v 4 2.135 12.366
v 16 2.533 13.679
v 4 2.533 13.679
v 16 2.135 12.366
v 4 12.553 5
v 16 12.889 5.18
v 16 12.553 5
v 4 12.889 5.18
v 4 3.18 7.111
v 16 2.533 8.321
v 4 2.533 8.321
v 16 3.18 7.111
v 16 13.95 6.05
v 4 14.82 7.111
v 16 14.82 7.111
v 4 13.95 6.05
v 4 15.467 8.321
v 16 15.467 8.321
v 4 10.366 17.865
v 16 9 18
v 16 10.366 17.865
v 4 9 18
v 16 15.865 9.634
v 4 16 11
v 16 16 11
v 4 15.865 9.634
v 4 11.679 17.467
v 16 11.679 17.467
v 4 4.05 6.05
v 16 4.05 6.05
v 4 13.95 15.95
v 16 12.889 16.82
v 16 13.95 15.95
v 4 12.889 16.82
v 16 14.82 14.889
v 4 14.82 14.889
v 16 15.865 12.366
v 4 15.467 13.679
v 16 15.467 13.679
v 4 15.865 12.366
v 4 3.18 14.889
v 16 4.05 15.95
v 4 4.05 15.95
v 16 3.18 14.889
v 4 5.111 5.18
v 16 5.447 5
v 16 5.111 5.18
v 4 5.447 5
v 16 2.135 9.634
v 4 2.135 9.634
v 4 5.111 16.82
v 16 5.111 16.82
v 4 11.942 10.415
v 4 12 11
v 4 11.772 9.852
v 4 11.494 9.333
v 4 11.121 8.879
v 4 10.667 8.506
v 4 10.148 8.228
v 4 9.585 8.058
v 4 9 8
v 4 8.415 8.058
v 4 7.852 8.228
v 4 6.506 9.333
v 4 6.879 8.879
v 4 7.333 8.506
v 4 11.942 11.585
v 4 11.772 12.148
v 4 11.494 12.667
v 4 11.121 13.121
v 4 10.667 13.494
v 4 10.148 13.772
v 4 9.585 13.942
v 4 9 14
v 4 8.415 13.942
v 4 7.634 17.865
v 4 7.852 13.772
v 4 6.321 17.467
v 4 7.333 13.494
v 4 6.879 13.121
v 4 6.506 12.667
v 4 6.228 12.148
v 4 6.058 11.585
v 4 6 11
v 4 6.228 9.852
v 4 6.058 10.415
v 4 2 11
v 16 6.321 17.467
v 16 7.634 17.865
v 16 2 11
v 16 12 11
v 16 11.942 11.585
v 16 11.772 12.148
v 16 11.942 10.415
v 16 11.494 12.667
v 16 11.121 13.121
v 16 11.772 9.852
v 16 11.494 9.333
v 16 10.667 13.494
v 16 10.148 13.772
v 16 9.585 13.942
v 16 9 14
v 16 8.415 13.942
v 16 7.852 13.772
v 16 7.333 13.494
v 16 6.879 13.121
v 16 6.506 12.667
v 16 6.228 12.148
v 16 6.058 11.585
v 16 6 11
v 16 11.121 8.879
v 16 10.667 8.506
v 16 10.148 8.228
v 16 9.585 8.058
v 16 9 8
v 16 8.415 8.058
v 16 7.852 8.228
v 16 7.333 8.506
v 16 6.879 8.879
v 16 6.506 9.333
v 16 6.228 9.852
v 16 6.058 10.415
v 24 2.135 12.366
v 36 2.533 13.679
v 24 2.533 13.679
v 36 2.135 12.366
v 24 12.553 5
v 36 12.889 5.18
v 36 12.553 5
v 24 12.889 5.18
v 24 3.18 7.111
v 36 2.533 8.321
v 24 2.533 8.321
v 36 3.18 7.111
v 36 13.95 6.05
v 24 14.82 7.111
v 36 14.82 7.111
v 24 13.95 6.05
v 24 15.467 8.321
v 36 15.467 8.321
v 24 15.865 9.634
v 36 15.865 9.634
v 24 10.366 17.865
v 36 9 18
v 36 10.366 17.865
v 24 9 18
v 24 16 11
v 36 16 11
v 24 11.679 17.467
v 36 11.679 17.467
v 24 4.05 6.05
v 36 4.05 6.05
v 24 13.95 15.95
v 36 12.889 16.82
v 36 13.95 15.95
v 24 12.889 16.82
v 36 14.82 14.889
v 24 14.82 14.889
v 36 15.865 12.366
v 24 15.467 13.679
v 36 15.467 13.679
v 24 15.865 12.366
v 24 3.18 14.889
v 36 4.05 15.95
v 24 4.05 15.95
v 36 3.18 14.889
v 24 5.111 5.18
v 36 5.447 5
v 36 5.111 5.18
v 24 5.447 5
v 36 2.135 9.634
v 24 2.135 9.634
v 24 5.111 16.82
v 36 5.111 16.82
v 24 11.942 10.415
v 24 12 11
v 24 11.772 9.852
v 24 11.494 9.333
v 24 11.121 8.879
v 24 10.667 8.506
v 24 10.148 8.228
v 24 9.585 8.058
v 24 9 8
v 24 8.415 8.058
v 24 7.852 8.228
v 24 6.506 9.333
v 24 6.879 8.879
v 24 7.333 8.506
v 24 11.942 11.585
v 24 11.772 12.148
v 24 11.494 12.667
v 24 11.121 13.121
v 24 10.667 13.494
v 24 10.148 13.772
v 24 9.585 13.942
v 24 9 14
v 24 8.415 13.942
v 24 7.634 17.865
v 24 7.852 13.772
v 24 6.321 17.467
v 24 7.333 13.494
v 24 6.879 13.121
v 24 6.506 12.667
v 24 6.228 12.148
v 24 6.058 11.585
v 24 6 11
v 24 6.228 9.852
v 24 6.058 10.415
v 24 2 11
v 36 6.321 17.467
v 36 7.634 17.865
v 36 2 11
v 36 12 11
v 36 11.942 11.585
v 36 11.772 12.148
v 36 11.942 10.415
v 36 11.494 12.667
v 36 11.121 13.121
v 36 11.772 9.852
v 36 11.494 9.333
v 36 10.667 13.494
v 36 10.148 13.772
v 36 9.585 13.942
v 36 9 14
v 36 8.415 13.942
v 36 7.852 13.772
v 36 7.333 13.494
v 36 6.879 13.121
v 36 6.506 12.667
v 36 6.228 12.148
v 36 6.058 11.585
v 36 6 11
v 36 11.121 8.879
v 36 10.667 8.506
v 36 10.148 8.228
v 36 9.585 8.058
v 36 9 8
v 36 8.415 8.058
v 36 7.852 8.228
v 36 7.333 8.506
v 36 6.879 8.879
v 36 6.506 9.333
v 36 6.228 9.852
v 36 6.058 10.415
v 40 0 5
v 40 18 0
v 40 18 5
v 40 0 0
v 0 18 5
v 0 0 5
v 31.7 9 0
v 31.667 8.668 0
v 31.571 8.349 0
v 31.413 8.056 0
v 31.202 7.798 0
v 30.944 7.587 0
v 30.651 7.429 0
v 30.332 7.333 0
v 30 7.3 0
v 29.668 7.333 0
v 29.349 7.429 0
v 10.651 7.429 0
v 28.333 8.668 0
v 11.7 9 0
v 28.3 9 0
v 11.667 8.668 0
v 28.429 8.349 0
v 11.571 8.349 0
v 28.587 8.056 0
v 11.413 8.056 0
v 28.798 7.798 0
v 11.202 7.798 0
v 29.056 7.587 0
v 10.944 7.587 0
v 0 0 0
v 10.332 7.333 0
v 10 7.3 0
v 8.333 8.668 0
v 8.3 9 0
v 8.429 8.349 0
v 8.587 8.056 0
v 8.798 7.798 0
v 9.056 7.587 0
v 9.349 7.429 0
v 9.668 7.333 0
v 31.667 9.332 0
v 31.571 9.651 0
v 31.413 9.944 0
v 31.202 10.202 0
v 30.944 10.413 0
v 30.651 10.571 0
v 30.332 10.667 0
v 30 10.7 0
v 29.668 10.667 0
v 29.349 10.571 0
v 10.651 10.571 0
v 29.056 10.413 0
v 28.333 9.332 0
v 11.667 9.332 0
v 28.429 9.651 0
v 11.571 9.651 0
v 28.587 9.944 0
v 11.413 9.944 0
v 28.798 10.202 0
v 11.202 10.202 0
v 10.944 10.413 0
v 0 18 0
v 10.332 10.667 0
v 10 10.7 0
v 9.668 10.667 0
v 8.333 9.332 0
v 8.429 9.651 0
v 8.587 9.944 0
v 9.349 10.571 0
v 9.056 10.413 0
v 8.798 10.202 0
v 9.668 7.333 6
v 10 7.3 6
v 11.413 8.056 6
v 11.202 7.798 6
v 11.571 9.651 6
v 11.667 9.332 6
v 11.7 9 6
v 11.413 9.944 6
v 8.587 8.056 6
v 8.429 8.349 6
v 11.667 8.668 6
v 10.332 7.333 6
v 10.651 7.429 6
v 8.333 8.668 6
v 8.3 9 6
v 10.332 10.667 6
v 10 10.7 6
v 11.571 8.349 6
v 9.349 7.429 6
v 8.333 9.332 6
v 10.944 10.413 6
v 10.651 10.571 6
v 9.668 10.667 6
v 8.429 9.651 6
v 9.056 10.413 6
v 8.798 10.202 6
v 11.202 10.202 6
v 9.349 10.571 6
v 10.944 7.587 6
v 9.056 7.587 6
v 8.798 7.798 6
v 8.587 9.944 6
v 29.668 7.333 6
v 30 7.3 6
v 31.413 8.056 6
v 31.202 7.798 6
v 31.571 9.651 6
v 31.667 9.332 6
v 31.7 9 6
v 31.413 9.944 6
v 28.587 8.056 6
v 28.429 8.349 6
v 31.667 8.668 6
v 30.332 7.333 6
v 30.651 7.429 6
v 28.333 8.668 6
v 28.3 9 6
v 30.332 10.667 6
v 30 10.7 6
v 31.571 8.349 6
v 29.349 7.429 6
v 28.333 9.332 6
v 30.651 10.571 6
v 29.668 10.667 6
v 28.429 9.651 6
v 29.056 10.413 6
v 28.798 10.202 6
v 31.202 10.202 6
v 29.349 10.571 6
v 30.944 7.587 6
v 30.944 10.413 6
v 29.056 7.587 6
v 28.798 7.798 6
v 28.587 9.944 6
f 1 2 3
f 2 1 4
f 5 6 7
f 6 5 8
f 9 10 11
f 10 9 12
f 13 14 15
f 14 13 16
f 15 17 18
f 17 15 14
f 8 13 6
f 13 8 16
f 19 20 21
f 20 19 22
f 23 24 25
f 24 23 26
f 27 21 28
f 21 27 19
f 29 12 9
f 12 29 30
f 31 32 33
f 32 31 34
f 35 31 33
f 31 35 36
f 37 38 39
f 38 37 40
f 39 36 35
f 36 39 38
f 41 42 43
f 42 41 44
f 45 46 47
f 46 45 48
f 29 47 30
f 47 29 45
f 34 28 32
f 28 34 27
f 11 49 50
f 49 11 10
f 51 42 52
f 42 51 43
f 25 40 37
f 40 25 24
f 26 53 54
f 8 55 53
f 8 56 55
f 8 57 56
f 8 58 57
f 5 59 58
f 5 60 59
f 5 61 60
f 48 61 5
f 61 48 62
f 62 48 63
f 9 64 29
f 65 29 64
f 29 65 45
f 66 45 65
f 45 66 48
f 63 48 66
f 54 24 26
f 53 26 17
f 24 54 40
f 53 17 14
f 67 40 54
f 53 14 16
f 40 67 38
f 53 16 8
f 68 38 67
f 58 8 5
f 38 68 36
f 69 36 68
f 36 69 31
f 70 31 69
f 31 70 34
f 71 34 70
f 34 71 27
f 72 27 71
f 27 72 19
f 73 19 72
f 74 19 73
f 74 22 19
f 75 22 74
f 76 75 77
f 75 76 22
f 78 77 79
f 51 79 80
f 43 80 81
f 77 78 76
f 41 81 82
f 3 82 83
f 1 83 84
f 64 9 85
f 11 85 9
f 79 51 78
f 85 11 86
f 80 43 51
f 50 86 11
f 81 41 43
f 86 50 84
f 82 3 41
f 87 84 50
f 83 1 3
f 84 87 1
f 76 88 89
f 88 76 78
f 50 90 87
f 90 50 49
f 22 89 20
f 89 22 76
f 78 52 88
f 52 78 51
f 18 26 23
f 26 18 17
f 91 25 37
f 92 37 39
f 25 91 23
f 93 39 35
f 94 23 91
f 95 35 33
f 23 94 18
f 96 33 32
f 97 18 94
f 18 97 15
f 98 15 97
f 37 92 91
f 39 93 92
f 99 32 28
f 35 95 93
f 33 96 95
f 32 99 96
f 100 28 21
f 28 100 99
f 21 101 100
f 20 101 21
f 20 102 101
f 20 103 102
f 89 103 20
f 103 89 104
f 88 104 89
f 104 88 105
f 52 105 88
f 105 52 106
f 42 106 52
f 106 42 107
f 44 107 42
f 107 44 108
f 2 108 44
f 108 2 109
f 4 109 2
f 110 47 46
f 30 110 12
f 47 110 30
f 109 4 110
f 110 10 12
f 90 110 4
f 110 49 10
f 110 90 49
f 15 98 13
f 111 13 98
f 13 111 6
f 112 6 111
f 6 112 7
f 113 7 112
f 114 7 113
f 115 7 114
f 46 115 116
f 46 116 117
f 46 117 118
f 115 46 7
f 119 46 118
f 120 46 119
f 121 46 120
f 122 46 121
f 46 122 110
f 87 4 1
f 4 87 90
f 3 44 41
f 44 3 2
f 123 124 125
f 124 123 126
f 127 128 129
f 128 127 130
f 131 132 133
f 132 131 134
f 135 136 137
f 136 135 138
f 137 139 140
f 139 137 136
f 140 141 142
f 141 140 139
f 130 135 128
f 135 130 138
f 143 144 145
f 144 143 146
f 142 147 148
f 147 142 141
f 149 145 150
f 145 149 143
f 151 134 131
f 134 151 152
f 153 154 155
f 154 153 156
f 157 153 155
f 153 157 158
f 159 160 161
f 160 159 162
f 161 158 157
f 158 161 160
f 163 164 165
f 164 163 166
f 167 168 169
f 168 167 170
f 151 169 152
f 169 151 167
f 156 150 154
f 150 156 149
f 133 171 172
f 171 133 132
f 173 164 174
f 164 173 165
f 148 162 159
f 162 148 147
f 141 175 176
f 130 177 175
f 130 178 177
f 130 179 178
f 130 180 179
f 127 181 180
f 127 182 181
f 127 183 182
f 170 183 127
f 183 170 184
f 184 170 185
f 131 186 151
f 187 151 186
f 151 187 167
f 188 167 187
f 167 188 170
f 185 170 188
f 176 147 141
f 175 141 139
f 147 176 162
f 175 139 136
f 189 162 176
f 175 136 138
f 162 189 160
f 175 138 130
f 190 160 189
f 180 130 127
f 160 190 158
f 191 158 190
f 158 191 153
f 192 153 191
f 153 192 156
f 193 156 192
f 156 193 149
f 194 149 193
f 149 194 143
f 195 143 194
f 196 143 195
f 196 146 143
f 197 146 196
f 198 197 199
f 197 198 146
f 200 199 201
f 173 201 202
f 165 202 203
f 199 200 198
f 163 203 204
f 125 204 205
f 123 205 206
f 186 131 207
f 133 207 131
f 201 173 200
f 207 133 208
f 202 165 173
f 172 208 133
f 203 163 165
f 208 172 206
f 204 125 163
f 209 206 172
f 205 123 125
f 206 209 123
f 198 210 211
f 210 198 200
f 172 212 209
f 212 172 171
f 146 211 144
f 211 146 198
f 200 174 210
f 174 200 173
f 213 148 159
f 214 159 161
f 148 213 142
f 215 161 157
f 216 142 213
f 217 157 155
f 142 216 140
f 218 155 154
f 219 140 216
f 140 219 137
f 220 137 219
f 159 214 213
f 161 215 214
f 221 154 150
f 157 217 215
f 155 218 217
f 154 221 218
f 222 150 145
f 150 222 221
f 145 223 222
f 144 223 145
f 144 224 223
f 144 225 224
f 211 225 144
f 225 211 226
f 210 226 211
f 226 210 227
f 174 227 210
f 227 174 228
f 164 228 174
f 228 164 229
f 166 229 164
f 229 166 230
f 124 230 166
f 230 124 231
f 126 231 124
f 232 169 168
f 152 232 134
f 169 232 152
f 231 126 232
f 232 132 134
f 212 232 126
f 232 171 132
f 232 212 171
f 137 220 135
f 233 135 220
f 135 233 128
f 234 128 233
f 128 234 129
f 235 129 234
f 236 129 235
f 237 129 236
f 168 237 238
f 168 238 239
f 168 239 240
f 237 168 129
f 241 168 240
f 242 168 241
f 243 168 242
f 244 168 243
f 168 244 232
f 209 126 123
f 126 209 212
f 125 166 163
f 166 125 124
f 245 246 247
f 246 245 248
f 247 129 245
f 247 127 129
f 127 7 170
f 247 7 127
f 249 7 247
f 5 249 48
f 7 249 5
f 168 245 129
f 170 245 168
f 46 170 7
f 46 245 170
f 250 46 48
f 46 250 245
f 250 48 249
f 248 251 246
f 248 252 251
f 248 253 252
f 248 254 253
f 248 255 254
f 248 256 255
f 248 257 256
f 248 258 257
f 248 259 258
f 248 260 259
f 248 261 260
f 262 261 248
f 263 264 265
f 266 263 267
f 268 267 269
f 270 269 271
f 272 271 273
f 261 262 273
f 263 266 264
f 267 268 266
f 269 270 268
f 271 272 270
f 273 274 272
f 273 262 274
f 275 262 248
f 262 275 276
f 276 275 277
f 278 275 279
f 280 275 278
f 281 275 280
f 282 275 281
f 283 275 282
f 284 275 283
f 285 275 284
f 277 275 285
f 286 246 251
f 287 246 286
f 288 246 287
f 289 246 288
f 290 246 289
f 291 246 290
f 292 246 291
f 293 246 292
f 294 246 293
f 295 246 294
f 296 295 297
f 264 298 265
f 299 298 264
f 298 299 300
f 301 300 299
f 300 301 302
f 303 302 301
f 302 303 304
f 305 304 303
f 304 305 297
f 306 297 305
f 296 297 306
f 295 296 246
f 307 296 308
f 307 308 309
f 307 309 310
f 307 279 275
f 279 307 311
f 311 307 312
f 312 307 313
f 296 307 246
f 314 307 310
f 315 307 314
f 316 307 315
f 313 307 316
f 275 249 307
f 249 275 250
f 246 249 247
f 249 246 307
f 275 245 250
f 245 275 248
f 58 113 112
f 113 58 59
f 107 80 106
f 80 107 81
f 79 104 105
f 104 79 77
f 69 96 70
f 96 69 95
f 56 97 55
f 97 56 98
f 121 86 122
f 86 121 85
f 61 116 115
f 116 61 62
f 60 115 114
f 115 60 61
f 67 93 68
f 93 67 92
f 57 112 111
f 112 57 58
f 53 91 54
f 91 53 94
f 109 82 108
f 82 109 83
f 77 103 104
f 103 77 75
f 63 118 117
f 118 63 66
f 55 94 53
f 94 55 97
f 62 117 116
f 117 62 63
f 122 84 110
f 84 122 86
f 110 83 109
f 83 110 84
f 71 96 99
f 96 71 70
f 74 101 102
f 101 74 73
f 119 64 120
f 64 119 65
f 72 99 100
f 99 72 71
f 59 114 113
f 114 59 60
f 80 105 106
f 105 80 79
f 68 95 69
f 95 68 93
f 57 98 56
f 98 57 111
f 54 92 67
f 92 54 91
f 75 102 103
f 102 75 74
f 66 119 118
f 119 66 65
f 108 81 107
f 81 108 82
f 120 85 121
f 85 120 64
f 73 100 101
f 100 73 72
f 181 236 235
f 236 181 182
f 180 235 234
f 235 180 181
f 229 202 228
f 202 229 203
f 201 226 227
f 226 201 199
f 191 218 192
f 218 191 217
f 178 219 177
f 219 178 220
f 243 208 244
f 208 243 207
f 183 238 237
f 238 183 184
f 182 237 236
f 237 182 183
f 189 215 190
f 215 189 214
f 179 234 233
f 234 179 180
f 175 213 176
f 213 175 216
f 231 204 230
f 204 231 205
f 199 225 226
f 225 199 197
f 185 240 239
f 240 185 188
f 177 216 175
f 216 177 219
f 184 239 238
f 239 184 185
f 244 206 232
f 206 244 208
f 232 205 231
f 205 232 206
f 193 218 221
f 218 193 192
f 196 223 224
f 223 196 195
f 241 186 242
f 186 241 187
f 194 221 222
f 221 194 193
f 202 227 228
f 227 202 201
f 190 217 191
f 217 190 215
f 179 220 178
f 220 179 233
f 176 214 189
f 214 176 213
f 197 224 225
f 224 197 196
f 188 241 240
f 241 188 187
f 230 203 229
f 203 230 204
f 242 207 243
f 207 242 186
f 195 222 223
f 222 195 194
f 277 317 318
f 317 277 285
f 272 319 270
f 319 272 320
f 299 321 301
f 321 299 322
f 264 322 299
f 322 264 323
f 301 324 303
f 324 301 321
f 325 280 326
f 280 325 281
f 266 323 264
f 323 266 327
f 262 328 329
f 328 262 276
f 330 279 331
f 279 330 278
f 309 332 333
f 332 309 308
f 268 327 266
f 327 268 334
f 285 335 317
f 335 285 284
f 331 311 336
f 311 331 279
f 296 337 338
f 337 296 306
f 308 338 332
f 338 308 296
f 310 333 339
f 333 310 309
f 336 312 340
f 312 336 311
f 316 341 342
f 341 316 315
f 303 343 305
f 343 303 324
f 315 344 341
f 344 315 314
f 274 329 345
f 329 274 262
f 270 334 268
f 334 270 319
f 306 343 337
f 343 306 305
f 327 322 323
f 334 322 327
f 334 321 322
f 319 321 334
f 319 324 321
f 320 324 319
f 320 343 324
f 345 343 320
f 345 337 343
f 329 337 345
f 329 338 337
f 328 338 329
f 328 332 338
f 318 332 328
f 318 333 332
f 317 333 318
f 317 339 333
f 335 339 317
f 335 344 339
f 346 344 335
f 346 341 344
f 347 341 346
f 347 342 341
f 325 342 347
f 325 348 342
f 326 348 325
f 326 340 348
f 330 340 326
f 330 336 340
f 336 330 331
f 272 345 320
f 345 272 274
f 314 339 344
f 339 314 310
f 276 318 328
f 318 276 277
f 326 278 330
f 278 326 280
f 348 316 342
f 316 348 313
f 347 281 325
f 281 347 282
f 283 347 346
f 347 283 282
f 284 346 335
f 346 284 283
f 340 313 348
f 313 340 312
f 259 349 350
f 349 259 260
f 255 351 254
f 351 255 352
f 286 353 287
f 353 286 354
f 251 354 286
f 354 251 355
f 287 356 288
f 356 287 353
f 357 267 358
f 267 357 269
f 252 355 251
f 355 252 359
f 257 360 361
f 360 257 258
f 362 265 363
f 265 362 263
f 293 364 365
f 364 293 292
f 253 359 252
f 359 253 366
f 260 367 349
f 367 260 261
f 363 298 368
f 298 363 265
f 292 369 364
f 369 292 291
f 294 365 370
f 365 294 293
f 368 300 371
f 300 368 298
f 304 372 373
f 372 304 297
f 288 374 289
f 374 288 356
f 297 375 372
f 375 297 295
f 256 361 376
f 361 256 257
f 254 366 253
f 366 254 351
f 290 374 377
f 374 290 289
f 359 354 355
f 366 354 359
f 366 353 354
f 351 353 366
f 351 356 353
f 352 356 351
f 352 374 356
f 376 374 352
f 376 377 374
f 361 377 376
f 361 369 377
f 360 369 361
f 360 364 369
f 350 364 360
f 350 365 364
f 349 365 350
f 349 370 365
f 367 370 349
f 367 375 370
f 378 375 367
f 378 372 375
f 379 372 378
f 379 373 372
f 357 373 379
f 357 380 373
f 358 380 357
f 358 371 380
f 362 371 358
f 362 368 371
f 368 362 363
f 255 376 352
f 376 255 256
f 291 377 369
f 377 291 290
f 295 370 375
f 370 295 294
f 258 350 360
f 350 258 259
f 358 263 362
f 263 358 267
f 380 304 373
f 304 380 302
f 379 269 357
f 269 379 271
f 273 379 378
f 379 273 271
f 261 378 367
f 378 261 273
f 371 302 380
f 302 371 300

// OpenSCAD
$fn = 32;

// ----------------------------------------------------------------------
// Cable clip: cable 6 mm, clamp 14 mm, base 40 mm
// ----------------------------------------------------------------------

// --- parameters (mm) ---
base_w = 40;              // base length, X
base_d = 18;              // base width, Y
base_t = 5;               // base thickness
clamp_d = 14;             // clamp outside diameter
wall_t = 4;               // clamp wall
cable_d = 6;              // cable opening
ring_w = 12;              // clamp width along the cable
screw_d = 3.4;            // screw clearance
sink = 1;                 // overlap of the clamp into the base
pitch = 20;               // distance between the two clamps

module base() {
  cube([base_w, base_d, base_t]);
}

module clamps() {
  for (sx = [-1, 1])
    translate([base_w / 2 + sx * pitch / 2, base_d / 2, base_t + clamp_d / 2 - sink]) rotate([0, 90, 0])
      cylinder(h = ring_w, d = clamp_d, center = true);
}

difference() {
  union() {
    base();
    clamps();
  }
  for (sx = [-1, 1])
    translate([base_w / 2 + sx * pitch / 2, base_d / 2, base_t + clamp_d / 2 - sink]) rotate([0, 90, 0]) translate([0, 0, -ring_w / 2 - 1]) cylinder(h = ring_w + 2, d = cable_d);
  translate([10, base_d / 2, -1]) cylinder(h = base_t + 2, d = screw_d);
  translate([30, base_d / 2, -1]) cylinder(h = base_t + 2, d = screw_d);
}
